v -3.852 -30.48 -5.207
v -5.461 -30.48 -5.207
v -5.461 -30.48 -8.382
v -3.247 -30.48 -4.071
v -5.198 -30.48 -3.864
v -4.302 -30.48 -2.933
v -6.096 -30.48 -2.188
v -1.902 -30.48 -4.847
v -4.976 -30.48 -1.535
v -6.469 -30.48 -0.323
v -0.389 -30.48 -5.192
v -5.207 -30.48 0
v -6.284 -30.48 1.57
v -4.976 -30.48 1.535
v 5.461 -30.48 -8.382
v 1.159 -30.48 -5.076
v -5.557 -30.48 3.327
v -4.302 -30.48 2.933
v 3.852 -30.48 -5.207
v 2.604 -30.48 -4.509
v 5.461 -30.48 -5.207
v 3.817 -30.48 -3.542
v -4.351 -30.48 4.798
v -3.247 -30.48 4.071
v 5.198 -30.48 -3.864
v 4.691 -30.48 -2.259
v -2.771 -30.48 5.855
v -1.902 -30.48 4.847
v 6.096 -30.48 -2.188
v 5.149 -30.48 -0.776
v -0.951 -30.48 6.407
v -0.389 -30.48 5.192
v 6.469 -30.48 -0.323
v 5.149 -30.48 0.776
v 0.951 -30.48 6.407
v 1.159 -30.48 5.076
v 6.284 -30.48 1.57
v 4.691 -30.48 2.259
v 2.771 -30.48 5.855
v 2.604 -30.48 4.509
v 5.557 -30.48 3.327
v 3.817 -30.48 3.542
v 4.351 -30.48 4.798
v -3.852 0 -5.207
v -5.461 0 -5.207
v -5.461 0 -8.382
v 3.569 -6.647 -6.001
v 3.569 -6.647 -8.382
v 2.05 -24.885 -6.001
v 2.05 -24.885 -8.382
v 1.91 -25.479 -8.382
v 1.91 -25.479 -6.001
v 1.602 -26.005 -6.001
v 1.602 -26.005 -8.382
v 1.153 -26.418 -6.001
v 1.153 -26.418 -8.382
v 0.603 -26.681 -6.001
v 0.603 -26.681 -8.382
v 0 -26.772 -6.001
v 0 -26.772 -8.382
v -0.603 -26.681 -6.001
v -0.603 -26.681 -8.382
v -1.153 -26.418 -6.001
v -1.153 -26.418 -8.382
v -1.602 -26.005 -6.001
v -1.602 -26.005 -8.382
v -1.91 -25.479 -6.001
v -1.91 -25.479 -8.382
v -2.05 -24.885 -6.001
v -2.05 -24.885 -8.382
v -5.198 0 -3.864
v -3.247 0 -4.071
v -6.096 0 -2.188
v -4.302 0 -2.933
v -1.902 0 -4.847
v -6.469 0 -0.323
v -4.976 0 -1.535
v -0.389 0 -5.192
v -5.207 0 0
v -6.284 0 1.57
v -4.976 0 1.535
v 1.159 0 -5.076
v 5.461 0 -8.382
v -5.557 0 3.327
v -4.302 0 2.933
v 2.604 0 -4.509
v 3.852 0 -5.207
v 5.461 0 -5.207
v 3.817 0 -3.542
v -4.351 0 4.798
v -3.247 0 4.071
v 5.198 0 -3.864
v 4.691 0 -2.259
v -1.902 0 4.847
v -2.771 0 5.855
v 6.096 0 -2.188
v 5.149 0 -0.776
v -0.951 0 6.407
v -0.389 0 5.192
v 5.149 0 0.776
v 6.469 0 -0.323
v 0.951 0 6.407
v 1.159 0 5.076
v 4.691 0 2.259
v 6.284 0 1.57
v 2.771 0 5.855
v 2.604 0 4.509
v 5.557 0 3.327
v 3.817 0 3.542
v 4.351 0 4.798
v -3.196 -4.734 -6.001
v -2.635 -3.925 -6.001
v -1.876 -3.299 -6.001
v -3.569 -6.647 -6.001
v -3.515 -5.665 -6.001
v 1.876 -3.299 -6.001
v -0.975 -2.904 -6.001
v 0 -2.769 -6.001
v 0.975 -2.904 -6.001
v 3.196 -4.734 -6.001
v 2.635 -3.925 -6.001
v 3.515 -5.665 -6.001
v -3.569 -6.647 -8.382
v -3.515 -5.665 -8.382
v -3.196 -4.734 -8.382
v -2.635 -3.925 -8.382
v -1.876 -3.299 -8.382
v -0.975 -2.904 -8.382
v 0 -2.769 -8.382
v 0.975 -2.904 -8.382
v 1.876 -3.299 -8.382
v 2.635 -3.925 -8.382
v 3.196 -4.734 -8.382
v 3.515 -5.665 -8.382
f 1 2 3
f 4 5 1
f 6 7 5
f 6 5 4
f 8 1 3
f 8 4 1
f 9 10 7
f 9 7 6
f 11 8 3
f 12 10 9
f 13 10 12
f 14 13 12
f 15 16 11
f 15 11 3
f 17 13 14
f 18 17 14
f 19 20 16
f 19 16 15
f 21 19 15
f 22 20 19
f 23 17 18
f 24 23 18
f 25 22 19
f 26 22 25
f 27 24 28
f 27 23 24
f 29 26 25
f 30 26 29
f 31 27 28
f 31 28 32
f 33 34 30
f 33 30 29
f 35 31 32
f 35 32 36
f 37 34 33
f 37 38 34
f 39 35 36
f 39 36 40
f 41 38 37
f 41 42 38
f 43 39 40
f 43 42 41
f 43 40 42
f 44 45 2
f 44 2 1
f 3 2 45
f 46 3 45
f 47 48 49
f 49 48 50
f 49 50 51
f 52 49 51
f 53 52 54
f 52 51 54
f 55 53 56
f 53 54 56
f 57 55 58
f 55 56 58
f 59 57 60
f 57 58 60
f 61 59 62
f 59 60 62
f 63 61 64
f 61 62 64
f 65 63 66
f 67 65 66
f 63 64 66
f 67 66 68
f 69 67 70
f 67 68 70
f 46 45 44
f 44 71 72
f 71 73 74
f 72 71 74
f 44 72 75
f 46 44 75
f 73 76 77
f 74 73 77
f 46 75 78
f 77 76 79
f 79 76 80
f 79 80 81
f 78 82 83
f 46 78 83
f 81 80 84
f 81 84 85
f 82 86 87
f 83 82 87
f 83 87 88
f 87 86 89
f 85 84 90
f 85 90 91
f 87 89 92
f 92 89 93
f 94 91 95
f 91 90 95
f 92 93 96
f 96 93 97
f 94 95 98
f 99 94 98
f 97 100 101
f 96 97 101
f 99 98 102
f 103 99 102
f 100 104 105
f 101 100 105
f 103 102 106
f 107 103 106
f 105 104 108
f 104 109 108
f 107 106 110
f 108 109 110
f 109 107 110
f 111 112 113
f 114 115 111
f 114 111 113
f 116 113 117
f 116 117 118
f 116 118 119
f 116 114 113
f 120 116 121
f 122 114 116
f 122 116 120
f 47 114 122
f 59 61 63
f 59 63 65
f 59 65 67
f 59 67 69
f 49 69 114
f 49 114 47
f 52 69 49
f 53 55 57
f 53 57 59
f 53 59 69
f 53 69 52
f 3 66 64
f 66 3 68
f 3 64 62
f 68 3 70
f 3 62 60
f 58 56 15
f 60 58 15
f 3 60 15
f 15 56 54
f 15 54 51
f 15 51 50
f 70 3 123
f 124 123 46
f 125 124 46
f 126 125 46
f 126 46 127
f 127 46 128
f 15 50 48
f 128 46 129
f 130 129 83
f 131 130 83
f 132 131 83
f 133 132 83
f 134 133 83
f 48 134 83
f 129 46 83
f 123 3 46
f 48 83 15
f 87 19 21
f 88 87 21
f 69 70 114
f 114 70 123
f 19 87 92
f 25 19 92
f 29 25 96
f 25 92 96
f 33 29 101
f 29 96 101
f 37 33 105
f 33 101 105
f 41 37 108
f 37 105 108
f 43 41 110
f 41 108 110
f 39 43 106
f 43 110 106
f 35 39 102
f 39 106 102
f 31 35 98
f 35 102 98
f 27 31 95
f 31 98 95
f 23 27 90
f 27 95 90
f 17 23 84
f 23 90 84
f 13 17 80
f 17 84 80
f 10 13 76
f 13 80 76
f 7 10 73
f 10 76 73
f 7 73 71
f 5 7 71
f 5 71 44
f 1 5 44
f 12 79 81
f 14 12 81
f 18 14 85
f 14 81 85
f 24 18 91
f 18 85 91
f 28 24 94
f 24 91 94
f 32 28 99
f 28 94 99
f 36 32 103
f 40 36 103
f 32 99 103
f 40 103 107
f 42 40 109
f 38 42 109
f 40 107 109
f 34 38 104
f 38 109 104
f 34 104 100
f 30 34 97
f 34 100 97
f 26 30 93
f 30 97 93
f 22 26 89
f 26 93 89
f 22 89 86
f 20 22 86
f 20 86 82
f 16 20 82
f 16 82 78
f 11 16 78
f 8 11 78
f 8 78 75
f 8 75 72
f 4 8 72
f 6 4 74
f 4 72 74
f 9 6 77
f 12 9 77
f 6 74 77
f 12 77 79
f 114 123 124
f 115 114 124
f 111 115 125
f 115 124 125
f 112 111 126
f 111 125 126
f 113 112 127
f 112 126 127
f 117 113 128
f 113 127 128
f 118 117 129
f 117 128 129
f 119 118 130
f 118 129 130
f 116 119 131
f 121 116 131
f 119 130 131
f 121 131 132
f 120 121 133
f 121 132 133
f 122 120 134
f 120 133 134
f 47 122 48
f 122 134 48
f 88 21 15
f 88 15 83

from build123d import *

# Parameters (mm, degrees)
F0_R     = 6.477
F1_DEPTH = 30.48
F2_R     = 5.207
F3_DEPTH = 30.48
F5_W     = 10.922
F5_H     = 30.48
F6_DEPTH = 3.175
F7_R     = 1.27
F8_DEPTH = 2.38125


with BuildPart() as f1:
    # F0 (on Front) → F1 (new body)
    with BuildSketch(Plane.XZ):
        Circle(F0_R)
    extrude(amount=F1_DEPTH)

    # F2 (on face) → F3 (cut, through all)
    with BuildSketch(Plane(origin=(0, 0, 0), x_dir=(-1, 0, 0), z_dir=(0, 1, 0))):
        Circle(F2_R)
    extrude(amount=-F3_DEPTH, mode=Mode.SUBTRACT)

    # F5 (on offset) → F6 (join)
    with BuildSketch(Plane.XY.offset(-5.207)):
        with Locations((0, -15.24)):
            Rectangle(F5_W, F5_H)
    extrude(amount=-F6_DEPTH)

    # F7 (on face) → F8 (cut)
    with BuildSketch(Plane(origin=(0, 0, -8.382), x_dir=(1, 0, 0), z_dir=(0, 0, -1))):
        with BuildLine():
            Line((3.569046, 6.647212), (2.050303, 24.884939))
            ThreePointArc((2.050303, 24.884939), (0, 26.7716), (-2.050303, 24.884939))
            Line((-2.050303, 24.884939), (-3.569046, 6.647212))
            ThreePointArc((-3.569046, 6.647212), (0, 2.7686), (3.569046, 6.647212))
        make_face()
        with Locations((0, 6.35)):
            Circle(F7_R, mode=Mode.SUBTRACT)
        with Locations((0, 6.35)):
            Circle(F7_R)
    extrude(amount=-F8_DEPTH, mode=Mode.SUBTRACT)


solid = f1.part
